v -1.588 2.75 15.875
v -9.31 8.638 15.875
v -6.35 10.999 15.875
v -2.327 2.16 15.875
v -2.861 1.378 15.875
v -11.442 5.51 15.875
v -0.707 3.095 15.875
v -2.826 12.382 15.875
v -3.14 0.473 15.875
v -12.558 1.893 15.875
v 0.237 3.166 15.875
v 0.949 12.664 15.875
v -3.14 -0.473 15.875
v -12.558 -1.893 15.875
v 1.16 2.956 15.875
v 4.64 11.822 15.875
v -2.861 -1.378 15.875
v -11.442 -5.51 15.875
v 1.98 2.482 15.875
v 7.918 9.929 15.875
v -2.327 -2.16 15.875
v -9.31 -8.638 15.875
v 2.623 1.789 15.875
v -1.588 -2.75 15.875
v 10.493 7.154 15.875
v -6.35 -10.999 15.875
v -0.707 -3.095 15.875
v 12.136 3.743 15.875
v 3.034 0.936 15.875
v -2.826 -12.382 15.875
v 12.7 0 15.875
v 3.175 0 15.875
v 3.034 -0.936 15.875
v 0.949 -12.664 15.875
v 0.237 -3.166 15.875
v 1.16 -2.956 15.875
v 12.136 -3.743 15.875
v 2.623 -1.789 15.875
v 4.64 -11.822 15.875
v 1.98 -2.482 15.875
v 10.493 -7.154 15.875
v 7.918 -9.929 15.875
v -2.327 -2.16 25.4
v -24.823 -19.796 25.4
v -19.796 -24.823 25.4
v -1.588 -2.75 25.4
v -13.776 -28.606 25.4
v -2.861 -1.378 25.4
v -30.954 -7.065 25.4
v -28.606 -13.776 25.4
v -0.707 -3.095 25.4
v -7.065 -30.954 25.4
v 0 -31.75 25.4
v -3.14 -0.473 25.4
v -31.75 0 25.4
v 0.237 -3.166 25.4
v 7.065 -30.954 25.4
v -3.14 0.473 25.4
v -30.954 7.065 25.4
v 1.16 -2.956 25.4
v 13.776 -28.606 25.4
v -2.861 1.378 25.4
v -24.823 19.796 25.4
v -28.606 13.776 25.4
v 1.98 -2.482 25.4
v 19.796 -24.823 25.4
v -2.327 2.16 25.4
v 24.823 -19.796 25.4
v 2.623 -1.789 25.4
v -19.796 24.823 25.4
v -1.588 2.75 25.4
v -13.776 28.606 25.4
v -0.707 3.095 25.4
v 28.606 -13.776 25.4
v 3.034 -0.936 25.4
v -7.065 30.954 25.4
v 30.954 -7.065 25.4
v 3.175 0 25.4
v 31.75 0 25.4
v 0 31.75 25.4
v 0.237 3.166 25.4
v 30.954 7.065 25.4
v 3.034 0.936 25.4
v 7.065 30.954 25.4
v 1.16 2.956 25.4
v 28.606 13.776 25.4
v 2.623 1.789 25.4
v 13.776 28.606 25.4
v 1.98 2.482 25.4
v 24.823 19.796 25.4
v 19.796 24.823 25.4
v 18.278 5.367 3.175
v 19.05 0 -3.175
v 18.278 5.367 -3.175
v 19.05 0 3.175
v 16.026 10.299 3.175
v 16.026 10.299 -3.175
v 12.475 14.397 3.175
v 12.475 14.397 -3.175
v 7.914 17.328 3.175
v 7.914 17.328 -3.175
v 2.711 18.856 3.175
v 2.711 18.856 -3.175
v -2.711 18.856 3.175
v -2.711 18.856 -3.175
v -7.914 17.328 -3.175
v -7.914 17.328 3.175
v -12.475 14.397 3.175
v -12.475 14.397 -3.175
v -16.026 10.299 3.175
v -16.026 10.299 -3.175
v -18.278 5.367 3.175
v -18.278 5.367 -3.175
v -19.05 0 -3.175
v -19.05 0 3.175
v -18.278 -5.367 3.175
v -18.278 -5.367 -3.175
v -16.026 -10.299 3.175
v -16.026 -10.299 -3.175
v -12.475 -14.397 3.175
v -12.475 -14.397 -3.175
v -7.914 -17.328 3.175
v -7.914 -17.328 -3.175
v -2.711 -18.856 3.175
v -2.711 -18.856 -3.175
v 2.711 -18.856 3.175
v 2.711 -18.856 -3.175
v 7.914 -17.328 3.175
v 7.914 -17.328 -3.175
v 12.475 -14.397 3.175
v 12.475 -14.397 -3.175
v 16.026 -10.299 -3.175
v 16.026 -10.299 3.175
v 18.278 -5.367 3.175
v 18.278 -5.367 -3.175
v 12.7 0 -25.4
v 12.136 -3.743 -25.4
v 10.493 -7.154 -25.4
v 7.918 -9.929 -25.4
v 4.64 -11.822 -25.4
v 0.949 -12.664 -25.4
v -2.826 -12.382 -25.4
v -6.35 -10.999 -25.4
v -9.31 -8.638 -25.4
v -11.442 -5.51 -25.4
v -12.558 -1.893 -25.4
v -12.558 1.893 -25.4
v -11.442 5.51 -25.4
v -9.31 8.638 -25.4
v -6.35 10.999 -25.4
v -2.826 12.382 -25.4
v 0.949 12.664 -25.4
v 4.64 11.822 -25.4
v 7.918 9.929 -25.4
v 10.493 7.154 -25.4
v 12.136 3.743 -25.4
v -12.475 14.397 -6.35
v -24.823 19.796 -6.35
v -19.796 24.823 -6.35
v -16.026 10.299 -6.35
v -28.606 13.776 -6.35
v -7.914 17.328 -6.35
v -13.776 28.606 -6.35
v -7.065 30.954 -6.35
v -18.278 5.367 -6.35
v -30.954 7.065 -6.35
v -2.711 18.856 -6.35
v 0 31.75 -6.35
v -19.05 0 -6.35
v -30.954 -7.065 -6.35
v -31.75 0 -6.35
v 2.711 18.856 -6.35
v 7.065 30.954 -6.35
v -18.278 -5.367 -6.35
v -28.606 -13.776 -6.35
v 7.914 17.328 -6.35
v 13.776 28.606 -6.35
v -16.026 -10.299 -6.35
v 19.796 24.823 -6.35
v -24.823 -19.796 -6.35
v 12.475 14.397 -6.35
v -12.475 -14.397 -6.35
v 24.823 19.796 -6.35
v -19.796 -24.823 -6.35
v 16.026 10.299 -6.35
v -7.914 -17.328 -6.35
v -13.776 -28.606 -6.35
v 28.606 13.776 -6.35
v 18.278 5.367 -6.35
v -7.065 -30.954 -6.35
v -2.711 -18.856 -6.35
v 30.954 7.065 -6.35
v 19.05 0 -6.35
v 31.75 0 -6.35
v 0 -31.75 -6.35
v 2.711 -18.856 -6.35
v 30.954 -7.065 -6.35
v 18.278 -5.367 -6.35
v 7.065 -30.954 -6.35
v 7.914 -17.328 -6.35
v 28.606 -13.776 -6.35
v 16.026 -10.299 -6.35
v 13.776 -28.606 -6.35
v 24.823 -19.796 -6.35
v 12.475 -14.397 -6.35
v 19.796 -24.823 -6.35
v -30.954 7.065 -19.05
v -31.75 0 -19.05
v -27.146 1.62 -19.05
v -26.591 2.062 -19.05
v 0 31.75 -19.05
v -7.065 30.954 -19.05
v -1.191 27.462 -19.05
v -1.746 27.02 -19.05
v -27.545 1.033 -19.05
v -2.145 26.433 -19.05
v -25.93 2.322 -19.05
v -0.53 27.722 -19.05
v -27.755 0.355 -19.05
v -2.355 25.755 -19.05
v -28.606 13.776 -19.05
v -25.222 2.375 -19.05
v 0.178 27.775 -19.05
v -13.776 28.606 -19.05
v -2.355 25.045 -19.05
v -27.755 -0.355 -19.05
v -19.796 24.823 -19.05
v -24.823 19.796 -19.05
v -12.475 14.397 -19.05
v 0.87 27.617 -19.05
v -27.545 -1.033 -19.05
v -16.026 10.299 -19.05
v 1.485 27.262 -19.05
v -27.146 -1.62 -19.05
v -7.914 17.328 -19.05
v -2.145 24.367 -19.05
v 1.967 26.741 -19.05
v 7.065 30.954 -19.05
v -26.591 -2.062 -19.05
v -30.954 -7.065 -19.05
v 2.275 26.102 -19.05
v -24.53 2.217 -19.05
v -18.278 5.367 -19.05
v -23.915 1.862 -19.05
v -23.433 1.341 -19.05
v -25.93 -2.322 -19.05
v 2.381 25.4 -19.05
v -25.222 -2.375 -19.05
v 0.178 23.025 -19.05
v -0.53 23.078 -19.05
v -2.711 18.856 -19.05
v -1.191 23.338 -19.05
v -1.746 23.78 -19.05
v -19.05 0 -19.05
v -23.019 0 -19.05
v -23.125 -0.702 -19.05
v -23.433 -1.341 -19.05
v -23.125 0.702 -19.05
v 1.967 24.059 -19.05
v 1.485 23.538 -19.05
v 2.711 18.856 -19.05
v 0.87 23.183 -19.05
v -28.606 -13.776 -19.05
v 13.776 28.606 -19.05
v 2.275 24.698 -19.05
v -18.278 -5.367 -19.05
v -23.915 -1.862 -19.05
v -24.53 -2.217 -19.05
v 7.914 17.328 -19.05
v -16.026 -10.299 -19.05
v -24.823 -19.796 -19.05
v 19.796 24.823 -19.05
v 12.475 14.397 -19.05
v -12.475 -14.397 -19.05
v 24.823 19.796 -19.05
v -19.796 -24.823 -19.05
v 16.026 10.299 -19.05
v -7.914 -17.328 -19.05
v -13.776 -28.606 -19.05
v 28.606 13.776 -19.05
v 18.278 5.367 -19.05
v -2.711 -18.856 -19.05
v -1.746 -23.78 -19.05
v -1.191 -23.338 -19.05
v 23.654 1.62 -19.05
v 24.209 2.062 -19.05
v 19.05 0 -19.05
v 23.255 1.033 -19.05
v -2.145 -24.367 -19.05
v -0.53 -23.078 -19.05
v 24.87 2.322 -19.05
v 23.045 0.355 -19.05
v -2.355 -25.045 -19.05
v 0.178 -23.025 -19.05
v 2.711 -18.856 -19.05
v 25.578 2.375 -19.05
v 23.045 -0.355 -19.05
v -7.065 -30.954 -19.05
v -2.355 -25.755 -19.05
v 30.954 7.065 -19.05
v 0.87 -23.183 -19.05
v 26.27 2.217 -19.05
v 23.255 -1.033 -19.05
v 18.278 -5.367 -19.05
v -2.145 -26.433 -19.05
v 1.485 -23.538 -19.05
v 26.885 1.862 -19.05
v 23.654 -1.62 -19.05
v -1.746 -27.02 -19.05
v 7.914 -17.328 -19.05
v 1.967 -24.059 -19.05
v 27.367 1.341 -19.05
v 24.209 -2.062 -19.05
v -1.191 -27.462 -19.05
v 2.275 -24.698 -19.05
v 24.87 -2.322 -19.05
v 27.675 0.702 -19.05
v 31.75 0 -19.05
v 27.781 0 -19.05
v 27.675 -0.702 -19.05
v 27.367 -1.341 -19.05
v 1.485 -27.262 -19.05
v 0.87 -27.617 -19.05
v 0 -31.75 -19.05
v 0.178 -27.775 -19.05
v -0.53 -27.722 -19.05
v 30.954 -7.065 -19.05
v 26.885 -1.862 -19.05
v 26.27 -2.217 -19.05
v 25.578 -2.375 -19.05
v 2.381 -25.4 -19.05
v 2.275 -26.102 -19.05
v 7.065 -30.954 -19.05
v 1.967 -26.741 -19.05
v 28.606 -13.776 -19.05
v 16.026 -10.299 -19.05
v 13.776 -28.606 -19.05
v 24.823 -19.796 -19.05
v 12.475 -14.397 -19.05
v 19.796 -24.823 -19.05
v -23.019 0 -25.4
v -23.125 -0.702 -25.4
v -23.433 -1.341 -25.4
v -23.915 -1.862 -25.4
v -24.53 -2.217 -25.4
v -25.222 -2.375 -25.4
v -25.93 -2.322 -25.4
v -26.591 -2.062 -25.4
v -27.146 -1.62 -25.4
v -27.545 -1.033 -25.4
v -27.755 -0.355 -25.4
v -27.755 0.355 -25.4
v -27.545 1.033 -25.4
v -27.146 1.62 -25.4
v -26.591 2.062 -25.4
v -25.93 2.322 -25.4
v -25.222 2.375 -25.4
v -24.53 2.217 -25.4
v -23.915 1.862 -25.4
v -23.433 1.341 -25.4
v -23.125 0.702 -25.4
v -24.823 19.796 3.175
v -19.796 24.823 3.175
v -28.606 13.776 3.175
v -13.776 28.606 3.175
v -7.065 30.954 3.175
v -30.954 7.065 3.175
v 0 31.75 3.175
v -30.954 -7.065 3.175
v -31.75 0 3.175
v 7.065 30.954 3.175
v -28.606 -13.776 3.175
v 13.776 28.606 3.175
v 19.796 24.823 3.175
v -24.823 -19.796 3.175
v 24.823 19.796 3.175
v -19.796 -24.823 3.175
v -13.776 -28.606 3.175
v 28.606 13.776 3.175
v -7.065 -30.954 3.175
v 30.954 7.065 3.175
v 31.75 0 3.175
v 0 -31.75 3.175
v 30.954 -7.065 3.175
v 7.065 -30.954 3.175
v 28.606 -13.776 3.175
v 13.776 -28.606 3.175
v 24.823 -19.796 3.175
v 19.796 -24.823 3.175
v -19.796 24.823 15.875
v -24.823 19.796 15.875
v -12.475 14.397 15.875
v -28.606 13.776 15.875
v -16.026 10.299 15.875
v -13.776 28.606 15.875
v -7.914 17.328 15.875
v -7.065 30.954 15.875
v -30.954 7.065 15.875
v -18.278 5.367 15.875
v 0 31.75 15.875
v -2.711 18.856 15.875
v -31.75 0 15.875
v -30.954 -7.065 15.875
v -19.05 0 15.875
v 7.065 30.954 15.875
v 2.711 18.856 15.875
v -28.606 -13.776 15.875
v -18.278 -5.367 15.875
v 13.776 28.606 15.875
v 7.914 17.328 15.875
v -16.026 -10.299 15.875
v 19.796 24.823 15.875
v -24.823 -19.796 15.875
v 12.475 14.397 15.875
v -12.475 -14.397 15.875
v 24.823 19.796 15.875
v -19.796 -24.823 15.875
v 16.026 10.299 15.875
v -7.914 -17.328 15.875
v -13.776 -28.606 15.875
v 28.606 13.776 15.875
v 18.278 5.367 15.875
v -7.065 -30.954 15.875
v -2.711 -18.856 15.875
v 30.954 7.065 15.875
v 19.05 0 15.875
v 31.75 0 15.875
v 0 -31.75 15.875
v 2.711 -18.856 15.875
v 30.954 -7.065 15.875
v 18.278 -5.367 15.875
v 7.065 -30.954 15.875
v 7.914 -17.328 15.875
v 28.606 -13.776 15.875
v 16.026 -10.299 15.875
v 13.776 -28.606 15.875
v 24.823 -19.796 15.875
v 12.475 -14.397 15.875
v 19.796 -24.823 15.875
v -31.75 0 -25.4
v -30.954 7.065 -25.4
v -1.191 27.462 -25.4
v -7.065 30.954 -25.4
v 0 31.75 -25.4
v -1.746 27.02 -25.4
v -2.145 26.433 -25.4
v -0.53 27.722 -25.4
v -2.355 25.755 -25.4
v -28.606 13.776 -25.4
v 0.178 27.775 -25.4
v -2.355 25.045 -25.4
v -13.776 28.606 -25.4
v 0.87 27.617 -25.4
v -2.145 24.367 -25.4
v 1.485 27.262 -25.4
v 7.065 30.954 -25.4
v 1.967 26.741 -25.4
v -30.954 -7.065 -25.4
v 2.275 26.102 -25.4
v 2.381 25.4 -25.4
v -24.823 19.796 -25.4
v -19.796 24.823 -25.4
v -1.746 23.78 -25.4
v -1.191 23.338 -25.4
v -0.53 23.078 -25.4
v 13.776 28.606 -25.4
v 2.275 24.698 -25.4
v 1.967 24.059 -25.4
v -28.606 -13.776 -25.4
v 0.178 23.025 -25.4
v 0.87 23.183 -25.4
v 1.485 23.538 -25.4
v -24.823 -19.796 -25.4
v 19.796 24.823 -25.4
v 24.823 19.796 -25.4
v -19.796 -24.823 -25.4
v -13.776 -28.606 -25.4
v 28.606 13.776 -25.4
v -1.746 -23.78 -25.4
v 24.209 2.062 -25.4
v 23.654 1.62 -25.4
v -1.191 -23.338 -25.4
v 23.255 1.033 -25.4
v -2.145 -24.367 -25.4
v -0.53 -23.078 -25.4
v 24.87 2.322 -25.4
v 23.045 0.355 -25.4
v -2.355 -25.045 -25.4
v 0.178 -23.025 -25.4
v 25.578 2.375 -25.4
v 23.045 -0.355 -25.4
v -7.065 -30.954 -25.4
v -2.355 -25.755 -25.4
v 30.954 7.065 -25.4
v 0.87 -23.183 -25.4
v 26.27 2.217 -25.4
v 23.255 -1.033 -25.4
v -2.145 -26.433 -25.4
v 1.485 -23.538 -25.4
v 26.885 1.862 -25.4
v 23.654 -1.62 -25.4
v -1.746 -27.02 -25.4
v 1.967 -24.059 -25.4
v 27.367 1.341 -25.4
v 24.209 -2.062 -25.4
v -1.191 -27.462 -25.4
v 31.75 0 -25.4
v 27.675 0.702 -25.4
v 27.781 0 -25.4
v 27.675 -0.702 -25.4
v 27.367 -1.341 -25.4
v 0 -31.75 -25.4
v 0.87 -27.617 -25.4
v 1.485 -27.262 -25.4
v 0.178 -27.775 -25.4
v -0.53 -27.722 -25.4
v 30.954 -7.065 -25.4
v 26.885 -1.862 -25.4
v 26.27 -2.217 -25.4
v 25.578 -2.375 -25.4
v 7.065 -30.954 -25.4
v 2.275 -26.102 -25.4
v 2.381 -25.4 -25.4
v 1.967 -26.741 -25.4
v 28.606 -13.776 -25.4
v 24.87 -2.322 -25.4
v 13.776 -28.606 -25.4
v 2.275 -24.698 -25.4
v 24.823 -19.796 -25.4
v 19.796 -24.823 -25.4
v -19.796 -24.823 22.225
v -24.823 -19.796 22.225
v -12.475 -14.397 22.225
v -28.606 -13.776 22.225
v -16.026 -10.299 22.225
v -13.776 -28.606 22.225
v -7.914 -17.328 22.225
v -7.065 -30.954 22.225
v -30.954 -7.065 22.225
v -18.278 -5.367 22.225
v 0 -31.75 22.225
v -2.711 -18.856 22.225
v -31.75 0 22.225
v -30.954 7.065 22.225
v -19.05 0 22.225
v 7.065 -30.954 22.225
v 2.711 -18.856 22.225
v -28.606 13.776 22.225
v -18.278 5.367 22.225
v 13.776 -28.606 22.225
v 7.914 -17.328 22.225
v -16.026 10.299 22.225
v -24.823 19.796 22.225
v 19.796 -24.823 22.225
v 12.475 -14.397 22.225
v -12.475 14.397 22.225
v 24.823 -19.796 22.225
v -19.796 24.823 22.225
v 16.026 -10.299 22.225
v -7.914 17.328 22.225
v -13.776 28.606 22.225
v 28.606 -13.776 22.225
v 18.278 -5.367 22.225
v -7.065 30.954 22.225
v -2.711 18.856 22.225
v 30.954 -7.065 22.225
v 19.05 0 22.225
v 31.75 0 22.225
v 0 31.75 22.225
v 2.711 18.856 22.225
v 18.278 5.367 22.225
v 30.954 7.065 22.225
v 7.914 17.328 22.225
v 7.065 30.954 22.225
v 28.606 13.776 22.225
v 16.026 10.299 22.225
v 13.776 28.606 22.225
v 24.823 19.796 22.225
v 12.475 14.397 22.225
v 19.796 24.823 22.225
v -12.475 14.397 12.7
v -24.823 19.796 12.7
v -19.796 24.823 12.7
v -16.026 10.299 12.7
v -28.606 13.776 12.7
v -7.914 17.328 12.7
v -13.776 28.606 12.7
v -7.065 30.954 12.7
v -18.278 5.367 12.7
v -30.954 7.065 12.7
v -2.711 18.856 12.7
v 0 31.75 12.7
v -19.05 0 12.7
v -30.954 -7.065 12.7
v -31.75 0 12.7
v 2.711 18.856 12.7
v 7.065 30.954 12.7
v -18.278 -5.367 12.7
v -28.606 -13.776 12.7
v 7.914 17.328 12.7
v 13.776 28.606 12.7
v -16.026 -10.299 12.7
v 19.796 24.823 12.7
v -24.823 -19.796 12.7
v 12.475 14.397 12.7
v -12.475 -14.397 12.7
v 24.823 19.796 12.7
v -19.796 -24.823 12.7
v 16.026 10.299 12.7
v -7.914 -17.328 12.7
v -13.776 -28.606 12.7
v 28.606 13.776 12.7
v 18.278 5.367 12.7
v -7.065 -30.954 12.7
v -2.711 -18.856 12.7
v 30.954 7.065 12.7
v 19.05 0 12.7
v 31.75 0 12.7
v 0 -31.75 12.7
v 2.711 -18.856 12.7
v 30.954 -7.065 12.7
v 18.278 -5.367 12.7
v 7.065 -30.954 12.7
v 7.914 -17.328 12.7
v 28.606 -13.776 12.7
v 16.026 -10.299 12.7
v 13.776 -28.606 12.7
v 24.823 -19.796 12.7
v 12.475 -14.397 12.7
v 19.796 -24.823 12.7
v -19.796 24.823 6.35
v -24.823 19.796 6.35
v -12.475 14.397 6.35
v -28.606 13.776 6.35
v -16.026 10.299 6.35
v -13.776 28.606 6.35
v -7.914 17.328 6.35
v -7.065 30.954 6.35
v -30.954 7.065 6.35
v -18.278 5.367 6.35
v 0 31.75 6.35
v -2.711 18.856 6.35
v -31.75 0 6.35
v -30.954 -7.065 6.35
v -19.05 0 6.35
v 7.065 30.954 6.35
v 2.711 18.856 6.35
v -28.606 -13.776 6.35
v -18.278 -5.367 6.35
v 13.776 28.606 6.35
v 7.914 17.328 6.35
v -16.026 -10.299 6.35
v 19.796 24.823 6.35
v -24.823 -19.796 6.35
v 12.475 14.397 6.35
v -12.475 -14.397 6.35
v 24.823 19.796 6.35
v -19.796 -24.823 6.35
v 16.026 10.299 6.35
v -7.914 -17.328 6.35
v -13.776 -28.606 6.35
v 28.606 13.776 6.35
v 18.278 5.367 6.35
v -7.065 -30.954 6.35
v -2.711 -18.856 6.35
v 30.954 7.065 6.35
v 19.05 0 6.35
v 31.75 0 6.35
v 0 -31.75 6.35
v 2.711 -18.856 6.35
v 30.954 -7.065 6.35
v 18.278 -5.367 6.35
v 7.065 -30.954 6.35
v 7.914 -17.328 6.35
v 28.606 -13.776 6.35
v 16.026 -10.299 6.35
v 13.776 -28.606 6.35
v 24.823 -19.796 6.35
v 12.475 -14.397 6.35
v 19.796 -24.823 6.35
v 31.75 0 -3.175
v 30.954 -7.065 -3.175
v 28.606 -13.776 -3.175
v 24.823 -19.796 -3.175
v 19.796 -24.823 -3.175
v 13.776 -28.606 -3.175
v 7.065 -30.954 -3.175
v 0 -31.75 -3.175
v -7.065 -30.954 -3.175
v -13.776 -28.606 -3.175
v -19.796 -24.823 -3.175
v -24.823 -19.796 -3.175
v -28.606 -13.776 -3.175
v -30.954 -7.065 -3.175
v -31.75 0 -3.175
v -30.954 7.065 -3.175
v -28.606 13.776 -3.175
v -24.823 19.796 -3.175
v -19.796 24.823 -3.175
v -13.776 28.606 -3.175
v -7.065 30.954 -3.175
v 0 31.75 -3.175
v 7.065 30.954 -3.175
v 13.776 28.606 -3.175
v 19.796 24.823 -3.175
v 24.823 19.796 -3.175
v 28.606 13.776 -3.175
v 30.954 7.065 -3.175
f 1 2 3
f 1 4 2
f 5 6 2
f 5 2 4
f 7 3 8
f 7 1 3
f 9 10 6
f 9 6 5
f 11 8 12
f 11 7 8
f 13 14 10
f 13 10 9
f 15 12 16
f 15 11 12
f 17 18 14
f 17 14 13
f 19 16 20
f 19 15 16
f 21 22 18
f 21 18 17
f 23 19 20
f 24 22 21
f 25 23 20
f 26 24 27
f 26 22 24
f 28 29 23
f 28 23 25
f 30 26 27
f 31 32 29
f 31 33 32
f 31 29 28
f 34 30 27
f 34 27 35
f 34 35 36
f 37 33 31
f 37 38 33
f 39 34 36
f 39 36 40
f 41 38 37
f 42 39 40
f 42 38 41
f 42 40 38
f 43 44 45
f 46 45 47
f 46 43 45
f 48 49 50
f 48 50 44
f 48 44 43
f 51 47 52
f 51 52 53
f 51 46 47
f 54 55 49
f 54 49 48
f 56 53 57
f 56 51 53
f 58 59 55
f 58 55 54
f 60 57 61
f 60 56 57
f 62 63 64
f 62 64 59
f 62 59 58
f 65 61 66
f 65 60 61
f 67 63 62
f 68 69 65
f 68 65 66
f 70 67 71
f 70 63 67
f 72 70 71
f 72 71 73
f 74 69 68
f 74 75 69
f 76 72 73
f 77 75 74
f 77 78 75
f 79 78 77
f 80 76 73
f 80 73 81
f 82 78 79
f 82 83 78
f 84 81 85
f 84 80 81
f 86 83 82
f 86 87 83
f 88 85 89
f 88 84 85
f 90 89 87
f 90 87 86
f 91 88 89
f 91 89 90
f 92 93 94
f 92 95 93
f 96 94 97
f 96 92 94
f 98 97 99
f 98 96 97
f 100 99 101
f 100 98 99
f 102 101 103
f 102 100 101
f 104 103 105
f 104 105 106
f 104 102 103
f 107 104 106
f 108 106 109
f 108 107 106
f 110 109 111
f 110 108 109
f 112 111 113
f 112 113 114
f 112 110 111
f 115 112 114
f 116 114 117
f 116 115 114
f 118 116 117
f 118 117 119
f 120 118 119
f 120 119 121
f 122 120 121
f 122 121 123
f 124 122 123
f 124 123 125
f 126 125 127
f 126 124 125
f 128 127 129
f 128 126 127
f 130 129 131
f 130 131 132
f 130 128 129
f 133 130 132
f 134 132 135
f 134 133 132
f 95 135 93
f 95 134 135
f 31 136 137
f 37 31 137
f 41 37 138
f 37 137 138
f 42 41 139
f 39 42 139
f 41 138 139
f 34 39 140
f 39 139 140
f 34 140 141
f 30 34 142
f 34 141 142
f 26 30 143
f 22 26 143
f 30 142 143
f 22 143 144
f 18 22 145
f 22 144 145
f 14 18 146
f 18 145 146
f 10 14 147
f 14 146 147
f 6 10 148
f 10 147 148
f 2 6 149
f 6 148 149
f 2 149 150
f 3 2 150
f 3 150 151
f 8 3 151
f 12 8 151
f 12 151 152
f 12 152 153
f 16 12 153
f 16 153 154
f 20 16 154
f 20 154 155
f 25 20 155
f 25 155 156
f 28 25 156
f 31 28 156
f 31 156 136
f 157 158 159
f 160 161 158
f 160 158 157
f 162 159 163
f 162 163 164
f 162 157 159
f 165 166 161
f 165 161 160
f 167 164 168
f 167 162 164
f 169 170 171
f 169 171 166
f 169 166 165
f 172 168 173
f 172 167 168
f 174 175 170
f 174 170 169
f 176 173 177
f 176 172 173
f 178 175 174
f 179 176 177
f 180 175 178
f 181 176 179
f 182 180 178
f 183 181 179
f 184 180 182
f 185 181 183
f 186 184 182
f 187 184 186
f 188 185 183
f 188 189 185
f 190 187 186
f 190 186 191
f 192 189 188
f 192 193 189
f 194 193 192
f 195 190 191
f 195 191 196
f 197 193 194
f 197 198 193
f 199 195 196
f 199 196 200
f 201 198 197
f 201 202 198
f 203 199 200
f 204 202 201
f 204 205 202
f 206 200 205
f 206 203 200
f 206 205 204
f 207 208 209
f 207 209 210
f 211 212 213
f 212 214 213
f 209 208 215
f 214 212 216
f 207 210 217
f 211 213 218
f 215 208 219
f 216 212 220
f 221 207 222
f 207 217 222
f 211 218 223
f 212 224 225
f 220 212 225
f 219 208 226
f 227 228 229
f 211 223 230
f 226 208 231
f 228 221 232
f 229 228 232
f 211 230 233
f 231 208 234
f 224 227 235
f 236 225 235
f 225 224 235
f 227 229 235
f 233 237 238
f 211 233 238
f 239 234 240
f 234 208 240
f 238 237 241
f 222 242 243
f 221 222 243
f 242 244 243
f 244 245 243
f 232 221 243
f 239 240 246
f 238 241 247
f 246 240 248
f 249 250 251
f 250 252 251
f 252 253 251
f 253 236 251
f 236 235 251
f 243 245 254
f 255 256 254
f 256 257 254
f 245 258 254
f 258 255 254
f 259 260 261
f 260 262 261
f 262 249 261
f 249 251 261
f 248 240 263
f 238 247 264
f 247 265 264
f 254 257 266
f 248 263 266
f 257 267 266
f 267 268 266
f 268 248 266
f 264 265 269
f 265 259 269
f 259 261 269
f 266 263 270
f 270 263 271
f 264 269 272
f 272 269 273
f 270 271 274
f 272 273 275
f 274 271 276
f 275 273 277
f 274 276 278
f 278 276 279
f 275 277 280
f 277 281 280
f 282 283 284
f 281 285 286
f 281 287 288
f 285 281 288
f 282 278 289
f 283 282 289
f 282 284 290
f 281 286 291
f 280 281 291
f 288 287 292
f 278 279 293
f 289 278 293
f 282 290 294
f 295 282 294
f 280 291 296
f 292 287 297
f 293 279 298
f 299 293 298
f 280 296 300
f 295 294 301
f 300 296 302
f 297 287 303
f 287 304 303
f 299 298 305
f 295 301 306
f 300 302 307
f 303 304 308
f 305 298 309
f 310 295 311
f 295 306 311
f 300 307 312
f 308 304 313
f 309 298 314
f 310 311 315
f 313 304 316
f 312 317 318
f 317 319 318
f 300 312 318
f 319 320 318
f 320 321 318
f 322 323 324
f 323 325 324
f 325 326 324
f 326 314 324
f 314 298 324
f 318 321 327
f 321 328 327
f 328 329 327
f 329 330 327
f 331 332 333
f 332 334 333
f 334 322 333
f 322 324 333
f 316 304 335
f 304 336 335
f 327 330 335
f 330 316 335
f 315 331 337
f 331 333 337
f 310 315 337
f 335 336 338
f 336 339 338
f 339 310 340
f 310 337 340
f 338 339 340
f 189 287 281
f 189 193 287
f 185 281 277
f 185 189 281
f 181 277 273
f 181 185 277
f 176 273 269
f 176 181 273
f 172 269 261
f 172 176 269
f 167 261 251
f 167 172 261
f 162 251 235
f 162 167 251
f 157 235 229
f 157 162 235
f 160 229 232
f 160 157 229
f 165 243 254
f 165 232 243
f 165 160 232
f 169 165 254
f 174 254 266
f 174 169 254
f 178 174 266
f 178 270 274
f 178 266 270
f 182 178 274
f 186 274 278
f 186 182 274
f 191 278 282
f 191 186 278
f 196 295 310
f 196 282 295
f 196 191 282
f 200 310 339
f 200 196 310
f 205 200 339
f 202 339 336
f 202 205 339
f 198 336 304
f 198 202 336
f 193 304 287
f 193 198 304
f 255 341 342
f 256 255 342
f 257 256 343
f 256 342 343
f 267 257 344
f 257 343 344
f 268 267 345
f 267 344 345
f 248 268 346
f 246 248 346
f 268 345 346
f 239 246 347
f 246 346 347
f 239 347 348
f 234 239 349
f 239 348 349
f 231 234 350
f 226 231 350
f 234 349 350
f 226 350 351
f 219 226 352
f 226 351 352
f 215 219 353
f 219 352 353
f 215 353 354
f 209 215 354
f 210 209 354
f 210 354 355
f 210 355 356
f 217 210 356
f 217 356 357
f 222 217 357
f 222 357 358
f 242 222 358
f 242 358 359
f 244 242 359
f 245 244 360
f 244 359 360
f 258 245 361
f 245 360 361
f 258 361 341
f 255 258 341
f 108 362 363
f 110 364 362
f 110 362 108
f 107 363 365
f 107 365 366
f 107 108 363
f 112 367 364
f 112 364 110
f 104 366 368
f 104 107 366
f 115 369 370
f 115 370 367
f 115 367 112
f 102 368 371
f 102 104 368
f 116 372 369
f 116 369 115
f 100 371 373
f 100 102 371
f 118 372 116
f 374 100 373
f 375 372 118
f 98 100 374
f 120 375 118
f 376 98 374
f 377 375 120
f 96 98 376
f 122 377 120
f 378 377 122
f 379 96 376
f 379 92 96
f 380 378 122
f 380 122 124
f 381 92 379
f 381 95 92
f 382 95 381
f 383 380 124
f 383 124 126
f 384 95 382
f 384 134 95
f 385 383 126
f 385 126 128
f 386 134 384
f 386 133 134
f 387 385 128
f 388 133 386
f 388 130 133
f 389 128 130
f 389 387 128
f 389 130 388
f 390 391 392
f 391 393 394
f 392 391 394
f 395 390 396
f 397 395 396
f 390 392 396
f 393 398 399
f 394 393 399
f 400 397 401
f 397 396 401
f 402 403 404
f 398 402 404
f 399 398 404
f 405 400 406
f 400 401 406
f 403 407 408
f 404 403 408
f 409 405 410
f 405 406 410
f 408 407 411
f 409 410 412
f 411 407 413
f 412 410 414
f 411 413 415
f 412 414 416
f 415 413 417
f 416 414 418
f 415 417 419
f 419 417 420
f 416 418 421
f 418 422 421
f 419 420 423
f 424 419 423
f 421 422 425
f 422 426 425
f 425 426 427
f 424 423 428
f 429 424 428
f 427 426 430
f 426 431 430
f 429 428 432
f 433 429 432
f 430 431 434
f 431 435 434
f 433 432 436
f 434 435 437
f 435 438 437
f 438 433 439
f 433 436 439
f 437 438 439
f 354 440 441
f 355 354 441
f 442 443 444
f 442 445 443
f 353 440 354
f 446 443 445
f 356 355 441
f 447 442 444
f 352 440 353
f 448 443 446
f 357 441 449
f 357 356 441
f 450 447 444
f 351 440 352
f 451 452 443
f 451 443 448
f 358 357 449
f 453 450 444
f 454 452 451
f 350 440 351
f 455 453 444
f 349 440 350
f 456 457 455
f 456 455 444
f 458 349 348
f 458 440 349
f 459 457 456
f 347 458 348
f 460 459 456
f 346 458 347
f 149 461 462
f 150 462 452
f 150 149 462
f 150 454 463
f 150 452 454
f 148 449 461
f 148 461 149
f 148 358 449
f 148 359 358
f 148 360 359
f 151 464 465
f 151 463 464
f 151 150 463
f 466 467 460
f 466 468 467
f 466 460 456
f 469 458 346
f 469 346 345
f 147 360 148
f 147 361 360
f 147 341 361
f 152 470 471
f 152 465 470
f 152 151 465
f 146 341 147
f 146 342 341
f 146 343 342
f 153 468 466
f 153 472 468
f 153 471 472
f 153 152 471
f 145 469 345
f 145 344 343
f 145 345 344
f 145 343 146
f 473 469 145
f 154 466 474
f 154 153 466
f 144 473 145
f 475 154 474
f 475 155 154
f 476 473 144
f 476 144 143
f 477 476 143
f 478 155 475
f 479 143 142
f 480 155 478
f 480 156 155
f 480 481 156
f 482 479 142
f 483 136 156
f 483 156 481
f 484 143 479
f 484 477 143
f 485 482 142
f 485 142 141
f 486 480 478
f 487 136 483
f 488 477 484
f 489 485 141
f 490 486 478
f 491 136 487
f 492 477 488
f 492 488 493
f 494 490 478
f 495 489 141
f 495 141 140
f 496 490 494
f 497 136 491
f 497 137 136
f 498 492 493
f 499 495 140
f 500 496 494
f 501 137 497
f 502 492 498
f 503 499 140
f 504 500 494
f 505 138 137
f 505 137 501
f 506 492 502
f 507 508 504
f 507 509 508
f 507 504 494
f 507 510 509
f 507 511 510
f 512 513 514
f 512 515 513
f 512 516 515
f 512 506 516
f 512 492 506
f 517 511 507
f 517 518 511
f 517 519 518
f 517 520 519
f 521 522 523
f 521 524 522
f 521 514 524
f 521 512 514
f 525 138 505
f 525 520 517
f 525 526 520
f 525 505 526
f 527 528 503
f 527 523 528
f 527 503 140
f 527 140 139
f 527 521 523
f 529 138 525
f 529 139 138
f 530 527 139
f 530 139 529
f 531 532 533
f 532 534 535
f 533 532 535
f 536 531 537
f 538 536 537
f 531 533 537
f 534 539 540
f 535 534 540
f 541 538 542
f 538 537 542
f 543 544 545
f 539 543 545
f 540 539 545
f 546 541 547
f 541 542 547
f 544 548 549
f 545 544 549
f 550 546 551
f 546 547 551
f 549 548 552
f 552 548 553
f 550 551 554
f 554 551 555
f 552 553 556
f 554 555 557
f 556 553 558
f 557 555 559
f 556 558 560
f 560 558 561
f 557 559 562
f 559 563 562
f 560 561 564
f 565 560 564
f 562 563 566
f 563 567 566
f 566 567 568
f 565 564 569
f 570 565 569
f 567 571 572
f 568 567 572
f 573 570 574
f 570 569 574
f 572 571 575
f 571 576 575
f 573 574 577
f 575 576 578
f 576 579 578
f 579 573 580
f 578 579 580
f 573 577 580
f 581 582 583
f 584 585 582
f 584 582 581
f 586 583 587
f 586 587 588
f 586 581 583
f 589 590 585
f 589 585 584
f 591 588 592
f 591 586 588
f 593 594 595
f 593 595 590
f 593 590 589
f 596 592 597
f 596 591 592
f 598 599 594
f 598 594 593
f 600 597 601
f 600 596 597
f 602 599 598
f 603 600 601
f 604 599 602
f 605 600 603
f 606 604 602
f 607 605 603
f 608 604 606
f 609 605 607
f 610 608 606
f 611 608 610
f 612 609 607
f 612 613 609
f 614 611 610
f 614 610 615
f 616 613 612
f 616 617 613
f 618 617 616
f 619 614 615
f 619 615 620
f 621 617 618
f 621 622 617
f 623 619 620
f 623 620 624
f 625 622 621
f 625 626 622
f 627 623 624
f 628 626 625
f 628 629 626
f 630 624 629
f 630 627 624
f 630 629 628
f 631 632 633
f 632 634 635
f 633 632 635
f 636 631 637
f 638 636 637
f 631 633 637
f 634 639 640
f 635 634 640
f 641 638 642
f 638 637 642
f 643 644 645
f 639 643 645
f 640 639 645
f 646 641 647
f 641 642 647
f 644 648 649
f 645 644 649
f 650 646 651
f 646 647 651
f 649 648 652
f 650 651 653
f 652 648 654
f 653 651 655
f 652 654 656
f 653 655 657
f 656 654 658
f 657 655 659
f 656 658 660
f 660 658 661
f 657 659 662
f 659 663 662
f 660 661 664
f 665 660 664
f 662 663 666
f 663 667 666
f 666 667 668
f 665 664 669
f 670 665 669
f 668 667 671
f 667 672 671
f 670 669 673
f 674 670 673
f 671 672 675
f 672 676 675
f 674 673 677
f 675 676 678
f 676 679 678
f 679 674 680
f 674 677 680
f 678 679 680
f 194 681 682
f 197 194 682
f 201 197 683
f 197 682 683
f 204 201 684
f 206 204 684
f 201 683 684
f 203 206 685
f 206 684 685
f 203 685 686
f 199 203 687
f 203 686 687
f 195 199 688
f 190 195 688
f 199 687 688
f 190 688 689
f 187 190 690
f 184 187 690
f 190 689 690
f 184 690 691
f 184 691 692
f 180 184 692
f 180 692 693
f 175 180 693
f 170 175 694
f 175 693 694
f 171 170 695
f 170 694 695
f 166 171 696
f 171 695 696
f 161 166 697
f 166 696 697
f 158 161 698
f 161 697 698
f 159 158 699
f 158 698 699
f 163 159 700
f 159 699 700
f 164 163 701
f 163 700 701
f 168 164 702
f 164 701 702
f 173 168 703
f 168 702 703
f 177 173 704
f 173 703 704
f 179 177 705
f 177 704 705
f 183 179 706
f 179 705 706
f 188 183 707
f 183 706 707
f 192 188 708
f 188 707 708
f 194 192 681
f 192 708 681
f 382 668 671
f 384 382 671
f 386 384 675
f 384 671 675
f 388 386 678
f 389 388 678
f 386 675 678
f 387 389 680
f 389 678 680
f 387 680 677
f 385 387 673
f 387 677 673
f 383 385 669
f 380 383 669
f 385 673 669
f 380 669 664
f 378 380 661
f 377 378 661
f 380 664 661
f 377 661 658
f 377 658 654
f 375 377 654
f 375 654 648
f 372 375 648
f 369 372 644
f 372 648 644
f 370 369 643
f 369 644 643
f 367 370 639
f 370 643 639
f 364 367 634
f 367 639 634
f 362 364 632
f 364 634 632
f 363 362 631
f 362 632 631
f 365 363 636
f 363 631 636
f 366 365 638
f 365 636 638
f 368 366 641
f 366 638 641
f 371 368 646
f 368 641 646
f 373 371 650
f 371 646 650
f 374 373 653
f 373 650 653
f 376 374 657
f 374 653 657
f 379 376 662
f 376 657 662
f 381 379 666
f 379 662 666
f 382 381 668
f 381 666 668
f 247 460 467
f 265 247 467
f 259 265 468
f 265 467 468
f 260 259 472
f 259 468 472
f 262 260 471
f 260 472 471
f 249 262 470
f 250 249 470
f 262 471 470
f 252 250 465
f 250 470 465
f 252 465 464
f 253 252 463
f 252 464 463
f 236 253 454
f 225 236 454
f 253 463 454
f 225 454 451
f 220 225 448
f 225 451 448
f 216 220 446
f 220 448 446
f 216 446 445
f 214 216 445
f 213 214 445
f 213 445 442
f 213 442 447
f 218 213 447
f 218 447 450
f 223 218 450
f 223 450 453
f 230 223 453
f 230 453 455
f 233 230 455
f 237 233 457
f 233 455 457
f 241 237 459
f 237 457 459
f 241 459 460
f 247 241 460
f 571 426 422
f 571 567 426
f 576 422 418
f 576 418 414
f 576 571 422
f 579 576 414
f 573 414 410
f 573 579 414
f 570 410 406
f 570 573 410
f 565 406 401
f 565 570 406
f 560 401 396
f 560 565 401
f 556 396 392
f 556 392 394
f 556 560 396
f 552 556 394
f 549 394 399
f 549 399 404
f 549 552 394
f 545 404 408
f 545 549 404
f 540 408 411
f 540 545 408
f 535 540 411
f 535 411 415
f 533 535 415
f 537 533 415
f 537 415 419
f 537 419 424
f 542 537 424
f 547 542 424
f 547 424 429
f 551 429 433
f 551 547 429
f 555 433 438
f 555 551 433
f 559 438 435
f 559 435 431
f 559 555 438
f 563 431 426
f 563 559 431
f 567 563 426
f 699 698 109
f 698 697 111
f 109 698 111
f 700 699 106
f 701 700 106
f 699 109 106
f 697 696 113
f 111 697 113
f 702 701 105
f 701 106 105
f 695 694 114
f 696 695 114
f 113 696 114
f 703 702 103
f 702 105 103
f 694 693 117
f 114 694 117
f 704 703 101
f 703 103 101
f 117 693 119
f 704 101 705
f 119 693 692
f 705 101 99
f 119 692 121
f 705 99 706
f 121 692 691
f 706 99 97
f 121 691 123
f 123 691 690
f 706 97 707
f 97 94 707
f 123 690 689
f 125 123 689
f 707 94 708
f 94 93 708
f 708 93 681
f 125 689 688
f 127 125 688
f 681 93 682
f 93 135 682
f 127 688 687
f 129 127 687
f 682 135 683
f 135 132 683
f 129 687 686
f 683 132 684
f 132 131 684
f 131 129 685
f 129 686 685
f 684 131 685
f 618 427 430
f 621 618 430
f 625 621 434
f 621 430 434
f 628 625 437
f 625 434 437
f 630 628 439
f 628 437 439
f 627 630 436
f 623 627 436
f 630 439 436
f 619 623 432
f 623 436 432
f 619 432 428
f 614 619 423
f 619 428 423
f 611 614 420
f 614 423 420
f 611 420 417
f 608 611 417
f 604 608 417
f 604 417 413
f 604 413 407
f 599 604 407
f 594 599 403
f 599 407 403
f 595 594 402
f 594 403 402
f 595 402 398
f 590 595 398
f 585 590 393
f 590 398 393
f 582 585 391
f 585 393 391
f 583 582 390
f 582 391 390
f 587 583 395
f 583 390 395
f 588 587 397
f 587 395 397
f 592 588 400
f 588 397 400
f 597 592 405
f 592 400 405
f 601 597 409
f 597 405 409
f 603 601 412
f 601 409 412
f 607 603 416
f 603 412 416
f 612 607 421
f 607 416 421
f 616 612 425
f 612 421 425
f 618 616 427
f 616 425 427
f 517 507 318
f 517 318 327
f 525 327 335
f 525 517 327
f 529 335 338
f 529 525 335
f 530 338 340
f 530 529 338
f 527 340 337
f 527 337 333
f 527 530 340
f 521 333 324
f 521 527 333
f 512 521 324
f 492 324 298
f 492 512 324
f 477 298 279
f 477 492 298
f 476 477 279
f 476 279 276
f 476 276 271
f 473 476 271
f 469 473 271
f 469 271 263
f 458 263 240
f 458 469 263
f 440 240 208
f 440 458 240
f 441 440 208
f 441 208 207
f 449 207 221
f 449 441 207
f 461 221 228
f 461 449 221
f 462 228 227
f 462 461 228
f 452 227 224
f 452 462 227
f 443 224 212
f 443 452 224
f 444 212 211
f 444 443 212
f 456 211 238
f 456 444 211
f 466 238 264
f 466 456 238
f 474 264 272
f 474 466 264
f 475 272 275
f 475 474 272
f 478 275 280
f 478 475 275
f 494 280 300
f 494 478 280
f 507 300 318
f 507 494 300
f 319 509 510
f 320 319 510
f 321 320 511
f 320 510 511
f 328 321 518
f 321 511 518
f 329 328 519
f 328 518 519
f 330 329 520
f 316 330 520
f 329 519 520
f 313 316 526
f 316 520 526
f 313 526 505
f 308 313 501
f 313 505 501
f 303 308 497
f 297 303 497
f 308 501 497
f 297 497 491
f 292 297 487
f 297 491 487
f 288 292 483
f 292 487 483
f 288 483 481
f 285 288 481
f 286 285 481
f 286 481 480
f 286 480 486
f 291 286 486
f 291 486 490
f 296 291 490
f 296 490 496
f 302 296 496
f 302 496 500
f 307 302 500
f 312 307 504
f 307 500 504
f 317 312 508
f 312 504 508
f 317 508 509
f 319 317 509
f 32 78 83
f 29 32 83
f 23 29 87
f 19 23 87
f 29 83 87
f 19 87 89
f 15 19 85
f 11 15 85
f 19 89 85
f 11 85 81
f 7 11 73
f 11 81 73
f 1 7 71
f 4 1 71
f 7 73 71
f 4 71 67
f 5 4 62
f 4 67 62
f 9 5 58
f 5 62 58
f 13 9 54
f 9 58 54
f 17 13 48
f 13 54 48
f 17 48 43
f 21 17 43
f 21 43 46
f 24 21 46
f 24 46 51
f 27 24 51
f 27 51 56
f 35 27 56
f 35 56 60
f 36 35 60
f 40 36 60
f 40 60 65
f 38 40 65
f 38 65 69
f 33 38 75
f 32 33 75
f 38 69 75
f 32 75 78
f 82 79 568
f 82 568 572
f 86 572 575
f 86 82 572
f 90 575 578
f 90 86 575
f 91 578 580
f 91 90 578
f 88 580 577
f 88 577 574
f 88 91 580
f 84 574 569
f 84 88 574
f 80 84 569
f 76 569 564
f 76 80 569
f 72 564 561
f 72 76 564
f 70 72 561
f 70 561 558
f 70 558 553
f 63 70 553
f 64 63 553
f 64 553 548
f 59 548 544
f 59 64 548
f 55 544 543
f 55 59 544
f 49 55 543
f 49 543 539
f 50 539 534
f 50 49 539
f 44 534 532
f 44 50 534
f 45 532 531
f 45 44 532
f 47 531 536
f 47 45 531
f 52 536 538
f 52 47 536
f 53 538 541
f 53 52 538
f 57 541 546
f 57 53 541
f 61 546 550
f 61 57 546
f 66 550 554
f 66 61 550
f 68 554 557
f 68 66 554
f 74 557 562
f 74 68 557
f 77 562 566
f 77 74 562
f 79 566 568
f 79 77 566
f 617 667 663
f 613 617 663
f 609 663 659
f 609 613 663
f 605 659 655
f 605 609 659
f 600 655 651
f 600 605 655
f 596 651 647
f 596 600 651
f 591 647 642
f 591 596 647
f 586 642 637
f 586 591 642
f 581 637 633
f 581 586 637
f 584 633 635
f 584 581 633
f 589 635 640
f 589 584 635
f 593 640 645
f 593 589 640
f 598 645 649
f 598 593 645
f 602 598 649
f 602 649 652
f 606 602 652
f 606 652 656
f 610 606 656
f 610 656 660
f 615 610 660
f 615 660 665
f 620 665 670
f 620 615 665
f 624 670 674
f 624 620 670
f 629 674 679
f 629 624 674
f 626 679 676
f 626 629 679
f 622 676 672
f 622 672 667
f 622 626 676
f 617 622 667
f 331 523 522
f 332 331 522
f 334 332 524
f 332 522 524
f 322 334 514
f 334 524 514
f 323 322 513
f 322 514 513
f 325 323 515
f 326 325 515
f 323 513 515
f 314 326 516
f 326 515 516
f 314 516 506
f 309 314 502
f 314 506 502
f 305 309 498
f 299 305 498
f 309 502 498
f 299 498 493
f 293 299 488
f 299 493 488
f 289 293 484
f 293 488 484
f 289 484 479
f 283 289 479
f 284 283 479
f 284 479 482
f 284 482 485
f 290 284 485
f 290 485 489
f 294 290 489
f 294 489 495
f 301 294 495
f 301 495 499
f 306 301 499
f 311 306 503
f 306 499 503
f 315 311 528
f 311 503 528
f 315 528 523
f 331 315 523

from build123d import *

# Parameters (mm, degrees)
F0_R          = 19.05
F1_DEPTH      = 25.4
F1_DEPTH_BACK = 25.4
F2_R          = 31.75
F2_R_2        = 2.38125
F2_R_3        = 19.05
F3_DEPTH      = 6.35
F4_R          = 12.7
F5_DEPTH      = 41.275
F6_R          = 3.175
F7_DEPTH      = 9.525
F8_R          = 31.75
F8_R_2        = 19.05
F9_DEPTH      = 3.175
F13_R         = 31.75
F13_R_2       = 12.7
F14_DEPTH     = 3.175
F15_R         = 31.75
F15_R_2       = 12.7
F16_DEPTH     = 3.175
F17_R         = 31.75
F17_R_2       = 12.7
F18_DEPTH     = 3.175


with BuildPart() as f1:
    # F0 (on Top) → F1 (new body, two sides)
    with BuildSketch(Plane.XY) as f1_sk:
        Circle(F0_R)
    extrude(amount=F1_DEPTH)
    extrude(f1_sk.sketch, amount=-F1_DEPTH_BACK)

    # F2 (on face) → F3 (join)
    with BuildSketch(Plane(origin=(0, 0, -25.4), x_dir=(1, 0, 0), z_dir=(0, 0, -1))):
        Circle(F2_R)
        with Locations((0, -25.4)):
            Circle(F2_R_2, mode=Mode.SUBTRACT)
        with Locations((-25.4, 0)):
            Circle(F2_R_2, mode=Mode.SUBTRACT)
        Circle(F2_R_3, mode=Mode.SUBTRACT)
        with Locations((25.4, 0)):
            Circle(F2_R_2, mode=Mode.SUBTRACT)
        with Locations((0, 25.4)):
            Circle(F2_R_2, mode=Mode.SUBTRACT)
    extrude(amount=-F3_DEPTH)

    # F4 (on face) → F5 (cut)
    with BuildSketch(Plane(origin=(0, 0, -25.4), x_dir=(1, 0, 0), z_dir=(0, 0, -1))):
        Circle(F4_R)
    extrude(amount=-F5_DEPTH, mode=Mode.SUBTRACT)

    # F6 (on face) → F7 (cut)
    with BuildSketch(Plane.XY.offset(25.4)):
        Circle(F6_R)
    extrude(amount=-F7_DEPTH, mode=Mode.SUBTRACT)

    # F8 (on face) → F9 (join)
    with BuildSketch(Plane.XY.offset(25.4)):
        Circle(F8_R)
        Circle(F8_R_2, mode=Mode.SUBTRACT)
    extrude(amount=-F9_DEPTH)

    # F13 (on offset) → F14 (join)
    with BuildSketch(Plane(origin=(0, 0, 15.875), x_dir=(1, 0, 0), z_dir=(0, 0, -1))):
        Circle(F13_R)
        Circle(F13_R_2, mode=Mode.SUBTRACT)
    extrude(amount=F14_DEPTH)

    # F15 (on offset) → F16 (join)
    with BuildSketch(Plane(origin=(0, 0, 6.35), x_dir=(1, 0, 0), z_dir=(0, 0, -1))):
        Circle(F15_R)
        Circle(F15_R_2, mode=Mode.SUBTRACT)
    extrude(amount=F16_DEPTH)

    # F17 (on offset) → F18 (join)
    with BuildSketch(Plane(origin=(0, 0, -3.175), x_dir=(1, 0, 0), z_dir=(0, 0, -1))):
        Circle(F17_R)
        Circle(F17_R_2, mode=Mode.SUBTRACT)
    extrude(amount=F18_DEPTH)


solid = f1.part
